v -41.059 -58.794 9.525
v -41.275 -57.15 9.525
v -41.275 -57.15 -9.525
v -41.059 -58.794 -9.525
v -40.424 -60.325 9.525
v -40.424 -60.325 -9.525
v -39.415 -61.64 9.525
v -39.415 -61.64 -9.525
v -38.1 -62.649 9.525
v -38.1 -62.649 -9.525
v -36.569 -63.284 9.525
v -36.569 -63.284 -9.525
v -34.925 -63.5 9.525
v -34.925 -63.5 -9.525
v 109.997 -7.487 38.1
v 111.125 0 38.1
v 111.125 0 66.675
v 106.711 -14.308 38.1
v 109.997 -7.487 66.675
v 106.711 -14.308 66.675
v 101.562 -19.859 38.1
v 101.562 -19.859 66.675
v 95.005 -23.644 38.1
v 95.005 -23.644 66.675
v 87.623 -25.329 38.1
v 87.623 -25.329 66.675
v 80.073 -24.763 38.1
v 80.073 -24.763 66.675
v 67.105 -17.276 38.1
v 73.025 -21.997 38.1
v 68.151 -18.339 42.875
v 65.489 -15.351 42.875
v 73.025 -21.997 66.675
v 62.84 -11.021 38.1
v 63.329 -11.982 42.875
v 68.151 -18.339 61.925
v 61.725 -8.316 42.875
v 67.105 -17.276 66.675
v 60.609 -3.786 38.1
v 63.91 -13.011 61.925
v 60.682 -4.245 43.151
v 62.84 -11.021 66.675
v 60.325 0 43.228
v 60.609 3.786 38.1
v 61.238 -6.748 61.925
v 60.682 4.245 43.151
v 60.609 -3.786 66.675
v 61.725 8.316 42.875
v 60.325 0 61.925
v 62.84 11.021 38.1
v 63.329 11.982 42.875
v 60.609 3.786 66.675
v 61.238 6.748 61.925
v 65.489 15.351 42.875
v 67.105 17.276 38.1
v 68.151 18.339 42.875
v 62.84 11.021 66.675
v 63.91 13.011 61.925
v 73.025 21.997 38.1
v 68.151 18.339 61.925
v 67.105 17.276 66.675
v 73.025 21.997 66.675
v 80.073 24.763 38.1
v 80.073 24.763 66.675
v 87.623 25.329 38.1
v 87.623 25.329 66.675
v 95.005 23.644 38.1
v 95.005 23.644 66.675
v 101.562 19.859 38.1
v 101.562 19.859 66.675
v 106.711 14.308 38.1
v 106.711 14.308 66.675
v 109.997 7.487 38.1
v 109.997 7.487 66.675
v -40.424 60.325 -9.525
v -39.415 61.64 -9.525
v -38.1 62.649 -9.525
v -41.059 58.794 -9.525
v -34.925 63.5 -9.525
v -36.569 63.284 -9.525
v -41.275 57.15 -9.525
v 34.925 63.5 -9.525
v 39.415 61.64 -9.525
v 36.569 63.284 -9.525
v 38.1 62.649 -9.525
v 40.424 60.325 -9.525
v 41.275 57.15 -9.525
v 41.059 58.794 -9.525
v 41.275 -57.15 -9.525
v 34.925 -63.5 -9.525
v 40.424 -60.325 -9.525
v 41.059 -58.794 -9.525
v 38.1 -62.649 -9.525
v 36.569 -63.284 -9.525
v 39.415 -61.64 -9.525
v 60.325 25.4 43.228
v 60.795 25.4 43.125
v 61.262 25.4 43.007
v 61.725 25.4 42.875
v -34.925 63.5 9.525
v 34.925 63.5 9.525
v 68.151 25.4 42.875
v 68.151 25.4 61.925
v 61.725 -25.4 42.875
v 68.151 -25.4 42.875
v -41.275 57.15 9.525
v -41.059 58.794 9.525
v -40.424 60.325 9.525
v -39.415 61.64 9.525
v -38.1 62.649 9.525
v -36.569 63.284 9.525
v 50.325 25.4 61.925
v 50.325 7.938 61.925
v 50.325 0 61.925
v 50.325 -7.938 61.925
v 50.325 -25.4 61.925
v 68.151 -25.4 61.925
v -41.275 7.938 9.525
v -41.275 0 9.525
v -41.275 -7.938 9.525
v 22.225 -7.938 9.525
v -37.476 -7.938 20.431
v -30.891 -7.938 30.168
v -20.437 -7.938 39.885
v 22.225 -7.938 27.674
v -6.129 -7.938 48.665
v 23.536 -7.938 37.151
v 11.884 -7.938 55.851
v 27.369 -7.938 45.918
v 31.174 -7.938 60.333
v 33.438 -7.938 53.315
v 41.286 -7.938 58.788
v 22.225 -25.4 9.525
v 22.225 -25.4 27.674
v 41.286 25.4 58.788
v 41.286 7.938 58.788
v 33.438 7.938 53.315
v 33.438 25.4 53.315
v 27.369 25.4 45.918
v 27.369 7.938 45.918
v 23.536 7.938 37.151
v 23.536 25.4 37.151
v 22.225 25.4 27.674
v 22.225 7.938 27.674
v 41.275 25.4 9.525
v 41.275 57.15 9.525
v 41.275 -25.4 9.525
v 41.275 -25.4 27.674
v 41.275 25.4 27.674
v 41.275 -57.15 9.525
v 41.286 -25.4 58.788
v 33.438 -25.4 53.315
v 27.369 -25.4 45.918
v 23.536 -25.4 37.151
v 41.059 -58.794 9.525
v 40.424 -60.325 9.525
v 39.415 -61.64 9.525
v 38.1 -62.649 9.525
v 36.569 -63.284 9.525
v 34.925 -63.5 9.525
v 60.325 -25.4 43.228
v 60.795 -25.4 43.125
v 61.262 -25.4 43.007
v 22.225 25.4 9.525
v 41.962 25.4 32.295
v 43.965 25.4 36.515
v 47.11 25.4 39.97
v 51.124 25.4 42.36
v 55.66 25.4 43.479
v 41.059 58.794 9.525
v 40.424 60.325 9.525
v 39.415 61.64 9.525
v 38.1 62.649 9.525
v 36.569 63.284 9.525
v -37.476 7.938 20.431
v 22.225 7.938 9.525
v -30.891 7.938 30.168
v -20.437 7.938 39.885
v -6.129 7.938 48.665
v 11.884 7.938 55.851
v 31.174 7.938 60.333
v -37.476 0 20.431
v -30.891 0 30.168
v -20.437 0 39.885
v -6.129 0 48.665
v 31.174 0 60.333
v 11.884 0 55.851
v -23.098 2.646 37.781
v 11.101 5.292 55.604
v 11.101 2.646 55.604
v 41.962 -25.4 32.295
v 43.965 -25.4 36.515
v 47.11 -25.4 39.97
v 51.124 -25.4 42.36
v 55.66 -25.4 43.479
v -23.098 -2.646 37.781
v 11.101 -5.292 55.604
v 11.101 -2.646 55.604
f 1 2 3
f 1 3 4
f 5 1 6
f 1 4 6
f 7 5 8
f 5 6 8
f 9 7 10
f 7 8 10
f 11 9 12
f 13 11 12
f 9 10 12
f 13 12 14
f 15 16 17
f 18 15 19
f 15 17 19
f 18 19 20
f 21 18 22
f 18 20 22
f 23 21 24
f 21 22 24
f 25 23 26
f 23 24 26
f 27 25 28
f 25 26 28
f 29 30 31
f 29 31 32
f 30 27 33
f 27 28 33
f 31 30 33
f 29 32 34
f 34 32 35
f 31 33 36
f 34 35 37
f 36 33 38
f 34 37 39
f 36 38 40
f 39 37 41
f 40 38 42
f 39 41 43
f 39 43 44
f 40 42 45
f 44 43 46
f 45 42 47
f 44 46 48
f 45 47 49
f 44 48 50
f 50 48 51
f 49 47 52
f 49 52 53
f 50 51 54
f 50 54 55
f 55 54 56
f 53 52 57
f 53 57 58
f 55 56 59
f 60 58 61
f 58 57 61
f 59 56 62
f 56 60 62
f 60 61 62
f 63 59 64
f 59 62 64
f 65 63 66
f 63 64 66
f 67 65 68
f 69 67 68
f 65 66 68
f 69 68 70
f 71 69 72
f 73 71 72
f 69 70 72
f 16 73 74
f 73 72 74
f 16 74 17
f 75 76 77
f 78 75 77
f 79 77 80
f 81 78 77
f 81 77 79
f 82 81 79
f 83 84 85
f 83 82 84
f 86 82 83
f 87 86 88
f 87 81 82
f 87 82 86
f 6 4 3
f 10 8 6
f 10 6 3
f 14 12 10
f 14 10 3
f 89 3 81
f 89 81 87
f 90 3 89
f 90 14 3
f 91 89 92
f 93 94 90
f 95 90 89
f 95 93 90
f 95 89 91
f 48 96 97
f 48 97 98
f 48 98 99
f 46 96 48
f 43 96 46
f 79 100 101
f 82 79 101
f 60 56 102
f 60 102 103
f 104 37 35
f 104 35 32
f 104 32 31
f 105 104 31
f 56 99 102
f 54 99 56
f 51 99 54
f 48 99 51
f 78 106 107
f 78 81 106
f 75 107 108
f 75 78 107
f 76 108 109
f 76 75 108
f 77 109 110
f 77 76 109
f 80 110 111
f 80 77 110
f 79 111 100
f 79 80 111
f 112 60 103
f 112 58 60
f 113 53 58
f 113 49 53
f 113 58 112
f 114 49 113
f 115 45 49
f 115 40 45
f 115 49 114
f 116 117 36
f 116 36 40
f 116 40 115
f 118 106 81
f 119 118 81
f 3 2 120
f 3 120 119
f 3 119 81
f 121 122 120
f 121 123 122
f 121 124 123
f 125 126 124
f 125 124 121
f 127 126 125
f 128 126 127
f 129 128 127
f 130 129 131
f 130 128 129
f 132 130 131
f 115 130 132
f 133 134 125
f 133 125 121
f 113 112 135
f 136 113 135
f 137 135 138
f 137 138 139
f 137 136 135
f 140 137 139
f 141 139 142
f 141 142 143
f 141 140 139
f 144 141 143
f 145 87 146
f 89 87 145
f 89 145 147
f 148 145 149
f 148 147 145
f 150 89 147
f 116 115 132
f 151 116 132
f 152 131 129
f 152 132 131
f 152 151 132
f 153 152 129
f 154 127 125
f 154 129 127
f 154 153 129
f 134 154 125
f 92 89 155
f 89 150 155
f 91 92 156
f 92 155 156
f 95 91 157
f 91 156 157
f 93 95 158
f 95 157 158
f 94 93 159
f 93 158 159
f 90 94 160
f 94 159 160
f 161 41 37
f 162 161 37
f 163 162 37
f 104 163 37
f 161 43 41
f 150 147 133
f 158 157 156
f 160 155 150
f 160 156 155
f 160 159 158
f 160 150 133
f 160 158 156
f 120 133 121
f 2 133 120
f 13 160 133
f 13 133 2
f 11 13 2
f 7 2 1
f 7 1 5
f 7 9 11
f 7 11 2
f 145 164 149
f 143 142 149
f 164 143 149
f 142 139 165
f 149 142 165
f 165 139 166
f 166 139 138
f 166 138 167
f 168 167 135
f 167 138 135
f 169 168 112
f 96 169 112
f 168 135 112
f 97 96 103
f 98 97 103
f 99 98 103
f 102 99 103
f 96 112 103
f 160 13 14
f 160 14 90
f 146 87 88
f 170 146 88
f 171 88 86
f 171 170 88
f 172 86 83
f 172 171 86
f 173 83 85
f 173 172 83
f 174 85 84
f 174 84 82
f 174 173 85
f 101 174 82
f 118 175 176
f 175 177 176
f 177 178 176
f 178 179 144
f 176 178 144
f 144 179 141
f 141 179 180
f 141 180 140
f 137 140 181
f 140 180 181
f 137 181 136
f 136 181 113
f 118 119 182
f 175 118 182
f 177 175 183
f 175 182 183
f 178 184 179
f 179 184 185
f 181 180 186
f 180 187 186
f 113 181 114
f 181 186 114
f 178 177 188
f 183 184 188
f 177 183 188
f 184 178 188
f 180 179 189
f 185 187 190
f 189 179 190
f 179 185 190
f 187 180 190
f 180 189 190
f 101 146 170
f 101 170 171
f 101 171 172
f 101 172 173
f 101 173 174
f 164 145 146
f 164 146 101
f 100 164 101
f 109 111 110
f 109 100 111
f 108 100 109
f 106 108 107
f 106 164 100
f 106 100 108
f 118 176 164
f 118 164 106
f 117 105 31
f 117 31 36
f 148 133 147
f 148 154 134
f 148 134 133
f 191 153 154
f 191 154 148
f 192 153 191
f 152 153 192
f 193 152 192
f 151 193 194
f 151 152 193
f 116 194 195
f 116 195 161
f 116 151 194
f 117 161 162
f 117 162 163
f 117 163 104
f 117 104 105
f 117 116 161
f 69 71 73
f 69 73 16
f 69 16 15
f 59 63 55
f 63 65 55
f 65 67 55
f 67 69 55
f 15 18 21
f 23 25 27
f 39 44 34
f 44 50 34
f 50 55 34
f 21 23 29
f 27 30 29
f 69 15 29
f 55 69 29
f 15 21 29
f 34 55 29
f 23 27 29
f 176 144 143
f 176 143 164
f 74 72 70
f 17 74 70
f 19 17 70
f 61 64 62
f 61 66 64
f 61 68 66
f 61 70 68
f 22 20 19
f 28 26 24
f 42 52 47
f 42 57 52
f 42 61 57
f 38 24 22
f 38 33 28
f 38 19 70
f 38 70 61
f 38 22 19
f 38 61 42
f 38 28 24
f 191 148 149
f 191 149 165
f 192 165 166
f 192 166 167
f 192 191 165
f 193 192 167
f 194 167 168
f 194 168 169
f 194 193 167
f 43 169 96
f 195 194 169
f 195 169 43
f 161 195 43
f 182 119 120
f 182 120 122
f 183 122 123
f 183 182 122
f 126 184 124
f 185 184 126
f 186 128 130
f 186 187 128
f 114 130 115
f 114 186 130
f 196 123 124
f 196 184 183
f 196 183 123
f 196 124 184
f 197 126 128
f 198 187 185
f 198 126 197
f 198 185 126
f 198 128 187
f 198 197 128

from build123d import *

# Parameters (mm, degrees)
F1_DEPTH = 63.5
F2_DEPTH = 7.9375
F3_DEPTH = 25.4
F0_W     = 25.4
F0_H     = 28.575
F5_R     = 6.35


with BuildPart() as f1:
    # F0 (on Front) → F1 (new body, symmetric)
    with BuildSketch(Plane.XZ):
        Polygon((41.275, -9.525), (41.275, 9.525), (22.225, 9.525), (-41.275, 9.525), (-41.275, -9.525), align=None)
    extrude(amount=F1_DEPTH, both=True)

    # F0 (on Front) → F2 (join, symmetric)
    with BuildSketch(Plane.XZ):
        with BuildLine():
            Line((-41.275, 9.525), (22.225, 9.525))
            Line((22.225, 9.525), (22.225, 27.673652))
            ThreePointArc((22.225, 27.673652), (30.148747, 49.82513), (50.324526, 61.9252))
            add(Edge.make_bspline(
                [(-41.275, 9.525), (-34.773878, 42.640614), (12.253828, 61.712361), (50.324526, 61.9252)],
                knots=[0, 0, 0, 0, 105.528452, 105.528452, 105.528452, 105.528452], degree=3))
        make_face()
    extrude(amount=F2_DEPTH, both=True)

    # F0 (on Front) → F3 (join, symmetric)
    with BuildSketch(Plane.XZ):
        with BuildLine():
            Line((22.225, 9.525), (41.275, 9.525))
            Line((41.275, 9.525), (41.275, 27.673652))
            ThreePointArc((41.275, 27.673652), (47.109768, 39.970374), (60.325, 43.227912))
            Line((60.325, 43.227912), (60.325, 61.9252))
            Line((60.325, 61.9252), (50.324526, 61.9252))
            ThreePointArc((50.324526, 61.9252), (30.148747, 49.82513), (22.225, 27.673652))
            Line((22.225, 27.673652), (22.225, 9.525))
        make_face()
        with BuildLine():
            Line((60.325, 61.9252), (60.325, 43.227912))
            ThreePointArc((60.325, 43.227912), (61.028899, 43.067475), (61.724775, 42.8752))
            Line((61.724775, 42.8752), (68.150982, 42.8752))
            Line((68.150982, 42.8752), (68.150982, 61.9252))
            Line((68.150982, 61.9252), (60.325, 61.9252))
        make_face()
    extrude(amount=F3_DEPTH, both=True)

    # F0 (on Front) → F4 (revolve)
    with BuildSketch(Plane.XZ):
        with Locations((98.425, 52.3875)):
            Rectangle(F0_W, F0_H)
    revolve(axis=Axis((85.725, 0, 52.3875), (0, 0, -1)))

    # F5
    f5_edges = [f1.edges().sort_by_distance(p)[0] for p in [
        (41.275, -63.5, 0),
        (-41.275, -63.5, 0),
        (41.275, 63.5, 0),
        (-41.275, 63.5, 0),
    ]]
    fillet(f5_edges, radius=F5_R)


solid = f1.part
